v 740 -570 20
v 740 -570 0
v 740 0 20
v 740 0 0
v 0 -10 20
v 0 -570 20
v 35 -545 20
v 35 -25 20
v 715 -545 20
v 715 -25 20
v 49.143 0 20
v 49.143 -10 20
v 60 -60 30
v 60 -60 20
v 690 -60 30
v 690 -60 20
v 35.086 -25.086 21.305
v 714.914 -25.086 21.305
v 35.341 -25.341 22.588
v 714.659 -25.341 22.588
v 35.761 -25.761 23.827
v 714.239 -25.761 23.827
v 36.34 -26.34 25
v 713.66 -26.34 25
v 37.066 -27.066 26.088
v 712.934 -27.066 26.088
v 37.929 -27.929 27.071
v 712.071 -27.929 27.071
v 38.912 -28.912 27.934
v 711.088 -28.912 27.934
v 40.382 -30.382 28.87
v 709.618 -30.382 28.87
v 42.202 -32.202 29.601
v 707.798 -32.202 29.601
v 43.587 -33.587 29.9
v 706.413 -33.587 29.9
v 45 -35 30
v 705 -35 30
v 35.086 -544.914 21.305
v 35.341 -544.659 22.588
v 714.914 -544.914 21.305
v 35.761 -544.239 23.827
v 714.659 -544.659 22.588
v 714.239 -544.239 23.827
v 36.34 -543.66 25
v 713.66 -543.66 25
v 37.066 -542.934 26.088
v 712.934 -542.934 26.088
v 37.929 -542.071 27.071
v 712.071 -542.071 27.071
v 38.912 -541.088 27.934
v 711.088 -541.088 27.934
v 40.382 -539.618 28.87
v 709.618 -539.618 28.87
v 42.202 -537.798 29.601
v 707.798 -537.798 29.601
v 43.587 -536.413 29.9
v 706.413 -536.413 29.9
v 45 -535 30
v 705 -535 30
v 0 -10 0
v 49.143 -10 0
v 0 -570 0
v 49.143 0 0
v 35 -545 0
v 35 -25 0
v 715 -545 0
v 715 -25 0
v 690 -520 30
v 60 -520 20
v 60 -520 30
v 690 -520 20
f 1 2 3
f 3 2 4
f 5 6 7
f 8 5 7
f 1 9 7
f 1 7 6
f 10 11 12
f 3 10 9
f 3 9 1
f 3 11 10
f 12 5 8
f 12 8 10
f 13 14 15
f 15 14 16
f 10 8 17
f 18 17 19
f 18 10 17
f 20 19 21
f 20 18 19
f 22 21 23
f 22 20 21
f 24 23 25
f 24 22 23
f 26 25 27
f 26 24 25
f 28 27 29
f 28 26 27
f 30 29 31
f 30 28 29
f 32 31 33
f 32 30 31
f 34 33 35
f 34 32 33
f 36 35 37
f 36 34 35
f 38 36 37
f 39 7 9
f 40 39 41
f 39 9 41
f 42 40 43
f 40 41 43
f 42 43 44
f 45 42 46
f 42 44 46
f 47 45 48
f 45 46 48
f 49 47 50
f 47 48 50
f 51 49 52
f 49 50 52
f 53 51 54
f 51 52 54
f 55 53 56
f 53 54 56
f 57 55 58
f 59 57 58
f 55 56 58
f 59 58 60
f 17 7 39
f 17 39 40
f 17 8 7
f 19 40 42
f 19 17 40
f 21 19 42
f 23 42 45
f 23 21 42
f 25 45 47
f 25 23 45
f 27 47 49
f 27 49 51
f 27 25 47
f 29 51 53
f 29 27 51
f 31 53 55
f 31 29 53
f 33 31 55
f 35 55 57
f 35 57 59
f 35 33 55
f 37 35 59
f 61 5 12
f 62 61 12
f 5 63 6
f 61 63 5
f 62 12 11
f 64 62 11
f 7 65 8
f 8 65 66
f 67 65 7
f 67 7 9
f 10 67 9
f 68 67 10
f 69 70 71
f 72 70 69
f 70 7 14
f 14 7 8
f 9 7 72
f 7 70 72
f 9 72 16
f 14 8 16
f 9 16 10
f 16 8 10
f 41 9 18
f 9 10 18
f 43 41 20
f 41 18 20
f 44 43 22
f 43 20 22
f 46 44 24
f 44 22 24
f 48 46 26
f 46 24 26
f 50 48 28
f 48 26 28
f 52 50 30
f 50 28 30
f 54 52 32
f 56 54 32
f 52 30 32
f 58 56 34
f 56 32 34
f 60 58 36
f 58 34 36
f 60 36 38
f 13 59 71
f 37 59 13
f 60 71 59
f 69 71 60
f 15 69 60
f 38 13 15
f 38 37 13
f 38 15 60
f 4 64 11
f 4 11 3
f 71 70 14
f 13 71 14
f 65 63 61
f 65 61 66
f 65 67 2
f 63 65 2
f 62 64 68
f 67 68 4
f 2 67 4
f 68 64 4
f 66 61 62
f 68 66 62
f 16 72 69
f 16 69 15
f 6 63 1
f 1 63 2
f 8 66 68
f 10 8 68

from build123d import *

# Parameters (mm, degrees)
ESBO_O2_W                = 740
ESBO_O2_H                = 570
ESBO_O2_W_2              = 680
ESBO_O2_H_2              = 520
RESSALTO_EXTRUS_O1_DEPTH = 20
ESBO_O3_W                = 680
ESBO_O3_H                = 520
ESBO_O3_W_2              = 630
ESBO_O3_H_2              = 460
RESSALTO_EXTRUS_O2_DEPTH = 10
FILETE1_R                = 10
ESBO_O4_W                = 49.143238
ESBO_O4_H                = 10
CORTE_EXTRUS_O1_DEPTH    = 20


with BuildPart() as part:
    # Esboço2 → Ressalto-extrusão1 (new body)
    with BuildSketch(Plane.XY):
        with Locations((370, -285)):
            Rectangle(ESBO_O2_W, ESBO_O2_H)
        with Locations((375, -285)):
            Rectangle(ESBO_O2_W_2, ESBO_O2_H_2, mode=Mode.SUBTRACT)
    extrude(amount=RESSALTO_EXTRUS_O1_DEPTH)

    # Esboço4 → Corte-extrusão1 (cut)
    with BuildSketch(Plane.XY.offset(20)):
        with Locations((24.571619, -5)):
            Rectangle(ESBO_O4_W, ESBO_O4_H)
    extrude(amount=-CORTE_EXTRUS_O1_DEPTH, mode=Mode.SUBTRACT)


with BuildPart() as body_2:
    # Esboço3 → Ressalto-extrusão2 (new body)
    with BuildSketch(Plane.XY.offset(20)):
        with Locations((375, -285)):
            Rectangle(ESBO_O3_W, ESBO_O3_H)
        with Locations((375, -290)):
            Rectangle(ESBO_O3_W_2, ESBO_O3_H_2, mode=Mode.SUBTRACT)
    extrude(amount=RESSALTO_EXTRUS_O2_DEPTH)

    # Filete1
    filete1_edges = [body_2.edges().sort_by_distance(p)[0] for p in [
        (715, -285, 30),
        (375, -25, 30),
        (35, -285, 30),
        (375, -545, 30),
    ]]
    fillet(filete1_edges, radius=FILETE1_R - 0.0001)  # a hair under: the kernel refuses the full size


solid = Compound([part.part, body_2.part])
